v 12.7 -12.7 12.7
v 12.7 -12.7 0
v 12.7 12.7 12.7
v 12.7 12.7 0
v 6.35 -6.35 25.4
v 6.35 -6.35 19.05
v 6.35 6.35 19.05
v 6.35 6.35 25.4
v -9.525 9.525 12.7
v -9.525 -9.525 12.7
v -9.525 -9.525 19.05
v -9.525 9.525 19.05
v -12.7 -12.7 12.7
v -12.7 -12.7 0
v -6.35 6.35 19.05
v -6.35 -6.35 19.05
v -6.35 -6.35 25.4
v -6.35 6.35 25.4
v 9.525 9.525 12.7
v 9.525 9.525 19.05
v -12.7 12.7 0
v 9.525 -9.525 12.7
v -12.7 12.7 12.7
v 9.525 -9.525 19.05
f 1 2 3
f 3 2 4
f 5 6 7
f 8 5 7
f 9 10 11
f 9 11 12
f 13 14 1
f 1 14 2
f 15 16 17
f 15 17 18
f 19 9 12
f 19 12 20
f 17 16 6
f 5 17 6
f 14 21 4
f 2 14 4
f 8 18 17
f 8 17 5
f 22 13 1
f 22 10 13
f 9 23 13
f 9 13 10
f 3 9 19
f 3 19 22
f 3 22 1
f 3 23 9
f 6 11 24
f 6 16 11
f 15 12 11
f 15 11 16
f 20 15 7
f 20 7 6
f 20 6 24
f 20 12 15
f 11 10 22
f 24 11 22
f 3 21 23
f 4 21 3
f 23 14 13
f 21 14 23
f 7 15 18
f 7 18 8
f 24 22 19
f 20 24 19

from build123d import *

# Parameters (mm, degrees)
F0_W     = 25.4
F0_H     = 25.4
F1_DEPTH = 12.7
F2_W     = 19.05
F2_H     = 19.05
F3_DEPTH = 6.35
F4_W     = 12.7
F4_H     = 12.7
F5_DEPTH = 6.35


with BuildPart() as f1:
    # F0 (on Top) → F1 (new body)
    with BuildSketch(Plane.XY):
        Rectangle(F0_W, F0_H)
    extrude(amount=F1_DEPTH)

    # F2 (on face) → F3 (join)
    with BuildSketch(Plane.XY.offset(12.7)):
        Rectangle(F2_W, F2_H)
    extrude(amount=F3_DEPTH)

    # F4 (on face) → F5 (join)
    with BuildSketch(Plane.XY.offset(19.05)):
        Rectangle(F4_W, F4_H)
    extrude(amount=F5_DEPTH)


solid = f1.part
